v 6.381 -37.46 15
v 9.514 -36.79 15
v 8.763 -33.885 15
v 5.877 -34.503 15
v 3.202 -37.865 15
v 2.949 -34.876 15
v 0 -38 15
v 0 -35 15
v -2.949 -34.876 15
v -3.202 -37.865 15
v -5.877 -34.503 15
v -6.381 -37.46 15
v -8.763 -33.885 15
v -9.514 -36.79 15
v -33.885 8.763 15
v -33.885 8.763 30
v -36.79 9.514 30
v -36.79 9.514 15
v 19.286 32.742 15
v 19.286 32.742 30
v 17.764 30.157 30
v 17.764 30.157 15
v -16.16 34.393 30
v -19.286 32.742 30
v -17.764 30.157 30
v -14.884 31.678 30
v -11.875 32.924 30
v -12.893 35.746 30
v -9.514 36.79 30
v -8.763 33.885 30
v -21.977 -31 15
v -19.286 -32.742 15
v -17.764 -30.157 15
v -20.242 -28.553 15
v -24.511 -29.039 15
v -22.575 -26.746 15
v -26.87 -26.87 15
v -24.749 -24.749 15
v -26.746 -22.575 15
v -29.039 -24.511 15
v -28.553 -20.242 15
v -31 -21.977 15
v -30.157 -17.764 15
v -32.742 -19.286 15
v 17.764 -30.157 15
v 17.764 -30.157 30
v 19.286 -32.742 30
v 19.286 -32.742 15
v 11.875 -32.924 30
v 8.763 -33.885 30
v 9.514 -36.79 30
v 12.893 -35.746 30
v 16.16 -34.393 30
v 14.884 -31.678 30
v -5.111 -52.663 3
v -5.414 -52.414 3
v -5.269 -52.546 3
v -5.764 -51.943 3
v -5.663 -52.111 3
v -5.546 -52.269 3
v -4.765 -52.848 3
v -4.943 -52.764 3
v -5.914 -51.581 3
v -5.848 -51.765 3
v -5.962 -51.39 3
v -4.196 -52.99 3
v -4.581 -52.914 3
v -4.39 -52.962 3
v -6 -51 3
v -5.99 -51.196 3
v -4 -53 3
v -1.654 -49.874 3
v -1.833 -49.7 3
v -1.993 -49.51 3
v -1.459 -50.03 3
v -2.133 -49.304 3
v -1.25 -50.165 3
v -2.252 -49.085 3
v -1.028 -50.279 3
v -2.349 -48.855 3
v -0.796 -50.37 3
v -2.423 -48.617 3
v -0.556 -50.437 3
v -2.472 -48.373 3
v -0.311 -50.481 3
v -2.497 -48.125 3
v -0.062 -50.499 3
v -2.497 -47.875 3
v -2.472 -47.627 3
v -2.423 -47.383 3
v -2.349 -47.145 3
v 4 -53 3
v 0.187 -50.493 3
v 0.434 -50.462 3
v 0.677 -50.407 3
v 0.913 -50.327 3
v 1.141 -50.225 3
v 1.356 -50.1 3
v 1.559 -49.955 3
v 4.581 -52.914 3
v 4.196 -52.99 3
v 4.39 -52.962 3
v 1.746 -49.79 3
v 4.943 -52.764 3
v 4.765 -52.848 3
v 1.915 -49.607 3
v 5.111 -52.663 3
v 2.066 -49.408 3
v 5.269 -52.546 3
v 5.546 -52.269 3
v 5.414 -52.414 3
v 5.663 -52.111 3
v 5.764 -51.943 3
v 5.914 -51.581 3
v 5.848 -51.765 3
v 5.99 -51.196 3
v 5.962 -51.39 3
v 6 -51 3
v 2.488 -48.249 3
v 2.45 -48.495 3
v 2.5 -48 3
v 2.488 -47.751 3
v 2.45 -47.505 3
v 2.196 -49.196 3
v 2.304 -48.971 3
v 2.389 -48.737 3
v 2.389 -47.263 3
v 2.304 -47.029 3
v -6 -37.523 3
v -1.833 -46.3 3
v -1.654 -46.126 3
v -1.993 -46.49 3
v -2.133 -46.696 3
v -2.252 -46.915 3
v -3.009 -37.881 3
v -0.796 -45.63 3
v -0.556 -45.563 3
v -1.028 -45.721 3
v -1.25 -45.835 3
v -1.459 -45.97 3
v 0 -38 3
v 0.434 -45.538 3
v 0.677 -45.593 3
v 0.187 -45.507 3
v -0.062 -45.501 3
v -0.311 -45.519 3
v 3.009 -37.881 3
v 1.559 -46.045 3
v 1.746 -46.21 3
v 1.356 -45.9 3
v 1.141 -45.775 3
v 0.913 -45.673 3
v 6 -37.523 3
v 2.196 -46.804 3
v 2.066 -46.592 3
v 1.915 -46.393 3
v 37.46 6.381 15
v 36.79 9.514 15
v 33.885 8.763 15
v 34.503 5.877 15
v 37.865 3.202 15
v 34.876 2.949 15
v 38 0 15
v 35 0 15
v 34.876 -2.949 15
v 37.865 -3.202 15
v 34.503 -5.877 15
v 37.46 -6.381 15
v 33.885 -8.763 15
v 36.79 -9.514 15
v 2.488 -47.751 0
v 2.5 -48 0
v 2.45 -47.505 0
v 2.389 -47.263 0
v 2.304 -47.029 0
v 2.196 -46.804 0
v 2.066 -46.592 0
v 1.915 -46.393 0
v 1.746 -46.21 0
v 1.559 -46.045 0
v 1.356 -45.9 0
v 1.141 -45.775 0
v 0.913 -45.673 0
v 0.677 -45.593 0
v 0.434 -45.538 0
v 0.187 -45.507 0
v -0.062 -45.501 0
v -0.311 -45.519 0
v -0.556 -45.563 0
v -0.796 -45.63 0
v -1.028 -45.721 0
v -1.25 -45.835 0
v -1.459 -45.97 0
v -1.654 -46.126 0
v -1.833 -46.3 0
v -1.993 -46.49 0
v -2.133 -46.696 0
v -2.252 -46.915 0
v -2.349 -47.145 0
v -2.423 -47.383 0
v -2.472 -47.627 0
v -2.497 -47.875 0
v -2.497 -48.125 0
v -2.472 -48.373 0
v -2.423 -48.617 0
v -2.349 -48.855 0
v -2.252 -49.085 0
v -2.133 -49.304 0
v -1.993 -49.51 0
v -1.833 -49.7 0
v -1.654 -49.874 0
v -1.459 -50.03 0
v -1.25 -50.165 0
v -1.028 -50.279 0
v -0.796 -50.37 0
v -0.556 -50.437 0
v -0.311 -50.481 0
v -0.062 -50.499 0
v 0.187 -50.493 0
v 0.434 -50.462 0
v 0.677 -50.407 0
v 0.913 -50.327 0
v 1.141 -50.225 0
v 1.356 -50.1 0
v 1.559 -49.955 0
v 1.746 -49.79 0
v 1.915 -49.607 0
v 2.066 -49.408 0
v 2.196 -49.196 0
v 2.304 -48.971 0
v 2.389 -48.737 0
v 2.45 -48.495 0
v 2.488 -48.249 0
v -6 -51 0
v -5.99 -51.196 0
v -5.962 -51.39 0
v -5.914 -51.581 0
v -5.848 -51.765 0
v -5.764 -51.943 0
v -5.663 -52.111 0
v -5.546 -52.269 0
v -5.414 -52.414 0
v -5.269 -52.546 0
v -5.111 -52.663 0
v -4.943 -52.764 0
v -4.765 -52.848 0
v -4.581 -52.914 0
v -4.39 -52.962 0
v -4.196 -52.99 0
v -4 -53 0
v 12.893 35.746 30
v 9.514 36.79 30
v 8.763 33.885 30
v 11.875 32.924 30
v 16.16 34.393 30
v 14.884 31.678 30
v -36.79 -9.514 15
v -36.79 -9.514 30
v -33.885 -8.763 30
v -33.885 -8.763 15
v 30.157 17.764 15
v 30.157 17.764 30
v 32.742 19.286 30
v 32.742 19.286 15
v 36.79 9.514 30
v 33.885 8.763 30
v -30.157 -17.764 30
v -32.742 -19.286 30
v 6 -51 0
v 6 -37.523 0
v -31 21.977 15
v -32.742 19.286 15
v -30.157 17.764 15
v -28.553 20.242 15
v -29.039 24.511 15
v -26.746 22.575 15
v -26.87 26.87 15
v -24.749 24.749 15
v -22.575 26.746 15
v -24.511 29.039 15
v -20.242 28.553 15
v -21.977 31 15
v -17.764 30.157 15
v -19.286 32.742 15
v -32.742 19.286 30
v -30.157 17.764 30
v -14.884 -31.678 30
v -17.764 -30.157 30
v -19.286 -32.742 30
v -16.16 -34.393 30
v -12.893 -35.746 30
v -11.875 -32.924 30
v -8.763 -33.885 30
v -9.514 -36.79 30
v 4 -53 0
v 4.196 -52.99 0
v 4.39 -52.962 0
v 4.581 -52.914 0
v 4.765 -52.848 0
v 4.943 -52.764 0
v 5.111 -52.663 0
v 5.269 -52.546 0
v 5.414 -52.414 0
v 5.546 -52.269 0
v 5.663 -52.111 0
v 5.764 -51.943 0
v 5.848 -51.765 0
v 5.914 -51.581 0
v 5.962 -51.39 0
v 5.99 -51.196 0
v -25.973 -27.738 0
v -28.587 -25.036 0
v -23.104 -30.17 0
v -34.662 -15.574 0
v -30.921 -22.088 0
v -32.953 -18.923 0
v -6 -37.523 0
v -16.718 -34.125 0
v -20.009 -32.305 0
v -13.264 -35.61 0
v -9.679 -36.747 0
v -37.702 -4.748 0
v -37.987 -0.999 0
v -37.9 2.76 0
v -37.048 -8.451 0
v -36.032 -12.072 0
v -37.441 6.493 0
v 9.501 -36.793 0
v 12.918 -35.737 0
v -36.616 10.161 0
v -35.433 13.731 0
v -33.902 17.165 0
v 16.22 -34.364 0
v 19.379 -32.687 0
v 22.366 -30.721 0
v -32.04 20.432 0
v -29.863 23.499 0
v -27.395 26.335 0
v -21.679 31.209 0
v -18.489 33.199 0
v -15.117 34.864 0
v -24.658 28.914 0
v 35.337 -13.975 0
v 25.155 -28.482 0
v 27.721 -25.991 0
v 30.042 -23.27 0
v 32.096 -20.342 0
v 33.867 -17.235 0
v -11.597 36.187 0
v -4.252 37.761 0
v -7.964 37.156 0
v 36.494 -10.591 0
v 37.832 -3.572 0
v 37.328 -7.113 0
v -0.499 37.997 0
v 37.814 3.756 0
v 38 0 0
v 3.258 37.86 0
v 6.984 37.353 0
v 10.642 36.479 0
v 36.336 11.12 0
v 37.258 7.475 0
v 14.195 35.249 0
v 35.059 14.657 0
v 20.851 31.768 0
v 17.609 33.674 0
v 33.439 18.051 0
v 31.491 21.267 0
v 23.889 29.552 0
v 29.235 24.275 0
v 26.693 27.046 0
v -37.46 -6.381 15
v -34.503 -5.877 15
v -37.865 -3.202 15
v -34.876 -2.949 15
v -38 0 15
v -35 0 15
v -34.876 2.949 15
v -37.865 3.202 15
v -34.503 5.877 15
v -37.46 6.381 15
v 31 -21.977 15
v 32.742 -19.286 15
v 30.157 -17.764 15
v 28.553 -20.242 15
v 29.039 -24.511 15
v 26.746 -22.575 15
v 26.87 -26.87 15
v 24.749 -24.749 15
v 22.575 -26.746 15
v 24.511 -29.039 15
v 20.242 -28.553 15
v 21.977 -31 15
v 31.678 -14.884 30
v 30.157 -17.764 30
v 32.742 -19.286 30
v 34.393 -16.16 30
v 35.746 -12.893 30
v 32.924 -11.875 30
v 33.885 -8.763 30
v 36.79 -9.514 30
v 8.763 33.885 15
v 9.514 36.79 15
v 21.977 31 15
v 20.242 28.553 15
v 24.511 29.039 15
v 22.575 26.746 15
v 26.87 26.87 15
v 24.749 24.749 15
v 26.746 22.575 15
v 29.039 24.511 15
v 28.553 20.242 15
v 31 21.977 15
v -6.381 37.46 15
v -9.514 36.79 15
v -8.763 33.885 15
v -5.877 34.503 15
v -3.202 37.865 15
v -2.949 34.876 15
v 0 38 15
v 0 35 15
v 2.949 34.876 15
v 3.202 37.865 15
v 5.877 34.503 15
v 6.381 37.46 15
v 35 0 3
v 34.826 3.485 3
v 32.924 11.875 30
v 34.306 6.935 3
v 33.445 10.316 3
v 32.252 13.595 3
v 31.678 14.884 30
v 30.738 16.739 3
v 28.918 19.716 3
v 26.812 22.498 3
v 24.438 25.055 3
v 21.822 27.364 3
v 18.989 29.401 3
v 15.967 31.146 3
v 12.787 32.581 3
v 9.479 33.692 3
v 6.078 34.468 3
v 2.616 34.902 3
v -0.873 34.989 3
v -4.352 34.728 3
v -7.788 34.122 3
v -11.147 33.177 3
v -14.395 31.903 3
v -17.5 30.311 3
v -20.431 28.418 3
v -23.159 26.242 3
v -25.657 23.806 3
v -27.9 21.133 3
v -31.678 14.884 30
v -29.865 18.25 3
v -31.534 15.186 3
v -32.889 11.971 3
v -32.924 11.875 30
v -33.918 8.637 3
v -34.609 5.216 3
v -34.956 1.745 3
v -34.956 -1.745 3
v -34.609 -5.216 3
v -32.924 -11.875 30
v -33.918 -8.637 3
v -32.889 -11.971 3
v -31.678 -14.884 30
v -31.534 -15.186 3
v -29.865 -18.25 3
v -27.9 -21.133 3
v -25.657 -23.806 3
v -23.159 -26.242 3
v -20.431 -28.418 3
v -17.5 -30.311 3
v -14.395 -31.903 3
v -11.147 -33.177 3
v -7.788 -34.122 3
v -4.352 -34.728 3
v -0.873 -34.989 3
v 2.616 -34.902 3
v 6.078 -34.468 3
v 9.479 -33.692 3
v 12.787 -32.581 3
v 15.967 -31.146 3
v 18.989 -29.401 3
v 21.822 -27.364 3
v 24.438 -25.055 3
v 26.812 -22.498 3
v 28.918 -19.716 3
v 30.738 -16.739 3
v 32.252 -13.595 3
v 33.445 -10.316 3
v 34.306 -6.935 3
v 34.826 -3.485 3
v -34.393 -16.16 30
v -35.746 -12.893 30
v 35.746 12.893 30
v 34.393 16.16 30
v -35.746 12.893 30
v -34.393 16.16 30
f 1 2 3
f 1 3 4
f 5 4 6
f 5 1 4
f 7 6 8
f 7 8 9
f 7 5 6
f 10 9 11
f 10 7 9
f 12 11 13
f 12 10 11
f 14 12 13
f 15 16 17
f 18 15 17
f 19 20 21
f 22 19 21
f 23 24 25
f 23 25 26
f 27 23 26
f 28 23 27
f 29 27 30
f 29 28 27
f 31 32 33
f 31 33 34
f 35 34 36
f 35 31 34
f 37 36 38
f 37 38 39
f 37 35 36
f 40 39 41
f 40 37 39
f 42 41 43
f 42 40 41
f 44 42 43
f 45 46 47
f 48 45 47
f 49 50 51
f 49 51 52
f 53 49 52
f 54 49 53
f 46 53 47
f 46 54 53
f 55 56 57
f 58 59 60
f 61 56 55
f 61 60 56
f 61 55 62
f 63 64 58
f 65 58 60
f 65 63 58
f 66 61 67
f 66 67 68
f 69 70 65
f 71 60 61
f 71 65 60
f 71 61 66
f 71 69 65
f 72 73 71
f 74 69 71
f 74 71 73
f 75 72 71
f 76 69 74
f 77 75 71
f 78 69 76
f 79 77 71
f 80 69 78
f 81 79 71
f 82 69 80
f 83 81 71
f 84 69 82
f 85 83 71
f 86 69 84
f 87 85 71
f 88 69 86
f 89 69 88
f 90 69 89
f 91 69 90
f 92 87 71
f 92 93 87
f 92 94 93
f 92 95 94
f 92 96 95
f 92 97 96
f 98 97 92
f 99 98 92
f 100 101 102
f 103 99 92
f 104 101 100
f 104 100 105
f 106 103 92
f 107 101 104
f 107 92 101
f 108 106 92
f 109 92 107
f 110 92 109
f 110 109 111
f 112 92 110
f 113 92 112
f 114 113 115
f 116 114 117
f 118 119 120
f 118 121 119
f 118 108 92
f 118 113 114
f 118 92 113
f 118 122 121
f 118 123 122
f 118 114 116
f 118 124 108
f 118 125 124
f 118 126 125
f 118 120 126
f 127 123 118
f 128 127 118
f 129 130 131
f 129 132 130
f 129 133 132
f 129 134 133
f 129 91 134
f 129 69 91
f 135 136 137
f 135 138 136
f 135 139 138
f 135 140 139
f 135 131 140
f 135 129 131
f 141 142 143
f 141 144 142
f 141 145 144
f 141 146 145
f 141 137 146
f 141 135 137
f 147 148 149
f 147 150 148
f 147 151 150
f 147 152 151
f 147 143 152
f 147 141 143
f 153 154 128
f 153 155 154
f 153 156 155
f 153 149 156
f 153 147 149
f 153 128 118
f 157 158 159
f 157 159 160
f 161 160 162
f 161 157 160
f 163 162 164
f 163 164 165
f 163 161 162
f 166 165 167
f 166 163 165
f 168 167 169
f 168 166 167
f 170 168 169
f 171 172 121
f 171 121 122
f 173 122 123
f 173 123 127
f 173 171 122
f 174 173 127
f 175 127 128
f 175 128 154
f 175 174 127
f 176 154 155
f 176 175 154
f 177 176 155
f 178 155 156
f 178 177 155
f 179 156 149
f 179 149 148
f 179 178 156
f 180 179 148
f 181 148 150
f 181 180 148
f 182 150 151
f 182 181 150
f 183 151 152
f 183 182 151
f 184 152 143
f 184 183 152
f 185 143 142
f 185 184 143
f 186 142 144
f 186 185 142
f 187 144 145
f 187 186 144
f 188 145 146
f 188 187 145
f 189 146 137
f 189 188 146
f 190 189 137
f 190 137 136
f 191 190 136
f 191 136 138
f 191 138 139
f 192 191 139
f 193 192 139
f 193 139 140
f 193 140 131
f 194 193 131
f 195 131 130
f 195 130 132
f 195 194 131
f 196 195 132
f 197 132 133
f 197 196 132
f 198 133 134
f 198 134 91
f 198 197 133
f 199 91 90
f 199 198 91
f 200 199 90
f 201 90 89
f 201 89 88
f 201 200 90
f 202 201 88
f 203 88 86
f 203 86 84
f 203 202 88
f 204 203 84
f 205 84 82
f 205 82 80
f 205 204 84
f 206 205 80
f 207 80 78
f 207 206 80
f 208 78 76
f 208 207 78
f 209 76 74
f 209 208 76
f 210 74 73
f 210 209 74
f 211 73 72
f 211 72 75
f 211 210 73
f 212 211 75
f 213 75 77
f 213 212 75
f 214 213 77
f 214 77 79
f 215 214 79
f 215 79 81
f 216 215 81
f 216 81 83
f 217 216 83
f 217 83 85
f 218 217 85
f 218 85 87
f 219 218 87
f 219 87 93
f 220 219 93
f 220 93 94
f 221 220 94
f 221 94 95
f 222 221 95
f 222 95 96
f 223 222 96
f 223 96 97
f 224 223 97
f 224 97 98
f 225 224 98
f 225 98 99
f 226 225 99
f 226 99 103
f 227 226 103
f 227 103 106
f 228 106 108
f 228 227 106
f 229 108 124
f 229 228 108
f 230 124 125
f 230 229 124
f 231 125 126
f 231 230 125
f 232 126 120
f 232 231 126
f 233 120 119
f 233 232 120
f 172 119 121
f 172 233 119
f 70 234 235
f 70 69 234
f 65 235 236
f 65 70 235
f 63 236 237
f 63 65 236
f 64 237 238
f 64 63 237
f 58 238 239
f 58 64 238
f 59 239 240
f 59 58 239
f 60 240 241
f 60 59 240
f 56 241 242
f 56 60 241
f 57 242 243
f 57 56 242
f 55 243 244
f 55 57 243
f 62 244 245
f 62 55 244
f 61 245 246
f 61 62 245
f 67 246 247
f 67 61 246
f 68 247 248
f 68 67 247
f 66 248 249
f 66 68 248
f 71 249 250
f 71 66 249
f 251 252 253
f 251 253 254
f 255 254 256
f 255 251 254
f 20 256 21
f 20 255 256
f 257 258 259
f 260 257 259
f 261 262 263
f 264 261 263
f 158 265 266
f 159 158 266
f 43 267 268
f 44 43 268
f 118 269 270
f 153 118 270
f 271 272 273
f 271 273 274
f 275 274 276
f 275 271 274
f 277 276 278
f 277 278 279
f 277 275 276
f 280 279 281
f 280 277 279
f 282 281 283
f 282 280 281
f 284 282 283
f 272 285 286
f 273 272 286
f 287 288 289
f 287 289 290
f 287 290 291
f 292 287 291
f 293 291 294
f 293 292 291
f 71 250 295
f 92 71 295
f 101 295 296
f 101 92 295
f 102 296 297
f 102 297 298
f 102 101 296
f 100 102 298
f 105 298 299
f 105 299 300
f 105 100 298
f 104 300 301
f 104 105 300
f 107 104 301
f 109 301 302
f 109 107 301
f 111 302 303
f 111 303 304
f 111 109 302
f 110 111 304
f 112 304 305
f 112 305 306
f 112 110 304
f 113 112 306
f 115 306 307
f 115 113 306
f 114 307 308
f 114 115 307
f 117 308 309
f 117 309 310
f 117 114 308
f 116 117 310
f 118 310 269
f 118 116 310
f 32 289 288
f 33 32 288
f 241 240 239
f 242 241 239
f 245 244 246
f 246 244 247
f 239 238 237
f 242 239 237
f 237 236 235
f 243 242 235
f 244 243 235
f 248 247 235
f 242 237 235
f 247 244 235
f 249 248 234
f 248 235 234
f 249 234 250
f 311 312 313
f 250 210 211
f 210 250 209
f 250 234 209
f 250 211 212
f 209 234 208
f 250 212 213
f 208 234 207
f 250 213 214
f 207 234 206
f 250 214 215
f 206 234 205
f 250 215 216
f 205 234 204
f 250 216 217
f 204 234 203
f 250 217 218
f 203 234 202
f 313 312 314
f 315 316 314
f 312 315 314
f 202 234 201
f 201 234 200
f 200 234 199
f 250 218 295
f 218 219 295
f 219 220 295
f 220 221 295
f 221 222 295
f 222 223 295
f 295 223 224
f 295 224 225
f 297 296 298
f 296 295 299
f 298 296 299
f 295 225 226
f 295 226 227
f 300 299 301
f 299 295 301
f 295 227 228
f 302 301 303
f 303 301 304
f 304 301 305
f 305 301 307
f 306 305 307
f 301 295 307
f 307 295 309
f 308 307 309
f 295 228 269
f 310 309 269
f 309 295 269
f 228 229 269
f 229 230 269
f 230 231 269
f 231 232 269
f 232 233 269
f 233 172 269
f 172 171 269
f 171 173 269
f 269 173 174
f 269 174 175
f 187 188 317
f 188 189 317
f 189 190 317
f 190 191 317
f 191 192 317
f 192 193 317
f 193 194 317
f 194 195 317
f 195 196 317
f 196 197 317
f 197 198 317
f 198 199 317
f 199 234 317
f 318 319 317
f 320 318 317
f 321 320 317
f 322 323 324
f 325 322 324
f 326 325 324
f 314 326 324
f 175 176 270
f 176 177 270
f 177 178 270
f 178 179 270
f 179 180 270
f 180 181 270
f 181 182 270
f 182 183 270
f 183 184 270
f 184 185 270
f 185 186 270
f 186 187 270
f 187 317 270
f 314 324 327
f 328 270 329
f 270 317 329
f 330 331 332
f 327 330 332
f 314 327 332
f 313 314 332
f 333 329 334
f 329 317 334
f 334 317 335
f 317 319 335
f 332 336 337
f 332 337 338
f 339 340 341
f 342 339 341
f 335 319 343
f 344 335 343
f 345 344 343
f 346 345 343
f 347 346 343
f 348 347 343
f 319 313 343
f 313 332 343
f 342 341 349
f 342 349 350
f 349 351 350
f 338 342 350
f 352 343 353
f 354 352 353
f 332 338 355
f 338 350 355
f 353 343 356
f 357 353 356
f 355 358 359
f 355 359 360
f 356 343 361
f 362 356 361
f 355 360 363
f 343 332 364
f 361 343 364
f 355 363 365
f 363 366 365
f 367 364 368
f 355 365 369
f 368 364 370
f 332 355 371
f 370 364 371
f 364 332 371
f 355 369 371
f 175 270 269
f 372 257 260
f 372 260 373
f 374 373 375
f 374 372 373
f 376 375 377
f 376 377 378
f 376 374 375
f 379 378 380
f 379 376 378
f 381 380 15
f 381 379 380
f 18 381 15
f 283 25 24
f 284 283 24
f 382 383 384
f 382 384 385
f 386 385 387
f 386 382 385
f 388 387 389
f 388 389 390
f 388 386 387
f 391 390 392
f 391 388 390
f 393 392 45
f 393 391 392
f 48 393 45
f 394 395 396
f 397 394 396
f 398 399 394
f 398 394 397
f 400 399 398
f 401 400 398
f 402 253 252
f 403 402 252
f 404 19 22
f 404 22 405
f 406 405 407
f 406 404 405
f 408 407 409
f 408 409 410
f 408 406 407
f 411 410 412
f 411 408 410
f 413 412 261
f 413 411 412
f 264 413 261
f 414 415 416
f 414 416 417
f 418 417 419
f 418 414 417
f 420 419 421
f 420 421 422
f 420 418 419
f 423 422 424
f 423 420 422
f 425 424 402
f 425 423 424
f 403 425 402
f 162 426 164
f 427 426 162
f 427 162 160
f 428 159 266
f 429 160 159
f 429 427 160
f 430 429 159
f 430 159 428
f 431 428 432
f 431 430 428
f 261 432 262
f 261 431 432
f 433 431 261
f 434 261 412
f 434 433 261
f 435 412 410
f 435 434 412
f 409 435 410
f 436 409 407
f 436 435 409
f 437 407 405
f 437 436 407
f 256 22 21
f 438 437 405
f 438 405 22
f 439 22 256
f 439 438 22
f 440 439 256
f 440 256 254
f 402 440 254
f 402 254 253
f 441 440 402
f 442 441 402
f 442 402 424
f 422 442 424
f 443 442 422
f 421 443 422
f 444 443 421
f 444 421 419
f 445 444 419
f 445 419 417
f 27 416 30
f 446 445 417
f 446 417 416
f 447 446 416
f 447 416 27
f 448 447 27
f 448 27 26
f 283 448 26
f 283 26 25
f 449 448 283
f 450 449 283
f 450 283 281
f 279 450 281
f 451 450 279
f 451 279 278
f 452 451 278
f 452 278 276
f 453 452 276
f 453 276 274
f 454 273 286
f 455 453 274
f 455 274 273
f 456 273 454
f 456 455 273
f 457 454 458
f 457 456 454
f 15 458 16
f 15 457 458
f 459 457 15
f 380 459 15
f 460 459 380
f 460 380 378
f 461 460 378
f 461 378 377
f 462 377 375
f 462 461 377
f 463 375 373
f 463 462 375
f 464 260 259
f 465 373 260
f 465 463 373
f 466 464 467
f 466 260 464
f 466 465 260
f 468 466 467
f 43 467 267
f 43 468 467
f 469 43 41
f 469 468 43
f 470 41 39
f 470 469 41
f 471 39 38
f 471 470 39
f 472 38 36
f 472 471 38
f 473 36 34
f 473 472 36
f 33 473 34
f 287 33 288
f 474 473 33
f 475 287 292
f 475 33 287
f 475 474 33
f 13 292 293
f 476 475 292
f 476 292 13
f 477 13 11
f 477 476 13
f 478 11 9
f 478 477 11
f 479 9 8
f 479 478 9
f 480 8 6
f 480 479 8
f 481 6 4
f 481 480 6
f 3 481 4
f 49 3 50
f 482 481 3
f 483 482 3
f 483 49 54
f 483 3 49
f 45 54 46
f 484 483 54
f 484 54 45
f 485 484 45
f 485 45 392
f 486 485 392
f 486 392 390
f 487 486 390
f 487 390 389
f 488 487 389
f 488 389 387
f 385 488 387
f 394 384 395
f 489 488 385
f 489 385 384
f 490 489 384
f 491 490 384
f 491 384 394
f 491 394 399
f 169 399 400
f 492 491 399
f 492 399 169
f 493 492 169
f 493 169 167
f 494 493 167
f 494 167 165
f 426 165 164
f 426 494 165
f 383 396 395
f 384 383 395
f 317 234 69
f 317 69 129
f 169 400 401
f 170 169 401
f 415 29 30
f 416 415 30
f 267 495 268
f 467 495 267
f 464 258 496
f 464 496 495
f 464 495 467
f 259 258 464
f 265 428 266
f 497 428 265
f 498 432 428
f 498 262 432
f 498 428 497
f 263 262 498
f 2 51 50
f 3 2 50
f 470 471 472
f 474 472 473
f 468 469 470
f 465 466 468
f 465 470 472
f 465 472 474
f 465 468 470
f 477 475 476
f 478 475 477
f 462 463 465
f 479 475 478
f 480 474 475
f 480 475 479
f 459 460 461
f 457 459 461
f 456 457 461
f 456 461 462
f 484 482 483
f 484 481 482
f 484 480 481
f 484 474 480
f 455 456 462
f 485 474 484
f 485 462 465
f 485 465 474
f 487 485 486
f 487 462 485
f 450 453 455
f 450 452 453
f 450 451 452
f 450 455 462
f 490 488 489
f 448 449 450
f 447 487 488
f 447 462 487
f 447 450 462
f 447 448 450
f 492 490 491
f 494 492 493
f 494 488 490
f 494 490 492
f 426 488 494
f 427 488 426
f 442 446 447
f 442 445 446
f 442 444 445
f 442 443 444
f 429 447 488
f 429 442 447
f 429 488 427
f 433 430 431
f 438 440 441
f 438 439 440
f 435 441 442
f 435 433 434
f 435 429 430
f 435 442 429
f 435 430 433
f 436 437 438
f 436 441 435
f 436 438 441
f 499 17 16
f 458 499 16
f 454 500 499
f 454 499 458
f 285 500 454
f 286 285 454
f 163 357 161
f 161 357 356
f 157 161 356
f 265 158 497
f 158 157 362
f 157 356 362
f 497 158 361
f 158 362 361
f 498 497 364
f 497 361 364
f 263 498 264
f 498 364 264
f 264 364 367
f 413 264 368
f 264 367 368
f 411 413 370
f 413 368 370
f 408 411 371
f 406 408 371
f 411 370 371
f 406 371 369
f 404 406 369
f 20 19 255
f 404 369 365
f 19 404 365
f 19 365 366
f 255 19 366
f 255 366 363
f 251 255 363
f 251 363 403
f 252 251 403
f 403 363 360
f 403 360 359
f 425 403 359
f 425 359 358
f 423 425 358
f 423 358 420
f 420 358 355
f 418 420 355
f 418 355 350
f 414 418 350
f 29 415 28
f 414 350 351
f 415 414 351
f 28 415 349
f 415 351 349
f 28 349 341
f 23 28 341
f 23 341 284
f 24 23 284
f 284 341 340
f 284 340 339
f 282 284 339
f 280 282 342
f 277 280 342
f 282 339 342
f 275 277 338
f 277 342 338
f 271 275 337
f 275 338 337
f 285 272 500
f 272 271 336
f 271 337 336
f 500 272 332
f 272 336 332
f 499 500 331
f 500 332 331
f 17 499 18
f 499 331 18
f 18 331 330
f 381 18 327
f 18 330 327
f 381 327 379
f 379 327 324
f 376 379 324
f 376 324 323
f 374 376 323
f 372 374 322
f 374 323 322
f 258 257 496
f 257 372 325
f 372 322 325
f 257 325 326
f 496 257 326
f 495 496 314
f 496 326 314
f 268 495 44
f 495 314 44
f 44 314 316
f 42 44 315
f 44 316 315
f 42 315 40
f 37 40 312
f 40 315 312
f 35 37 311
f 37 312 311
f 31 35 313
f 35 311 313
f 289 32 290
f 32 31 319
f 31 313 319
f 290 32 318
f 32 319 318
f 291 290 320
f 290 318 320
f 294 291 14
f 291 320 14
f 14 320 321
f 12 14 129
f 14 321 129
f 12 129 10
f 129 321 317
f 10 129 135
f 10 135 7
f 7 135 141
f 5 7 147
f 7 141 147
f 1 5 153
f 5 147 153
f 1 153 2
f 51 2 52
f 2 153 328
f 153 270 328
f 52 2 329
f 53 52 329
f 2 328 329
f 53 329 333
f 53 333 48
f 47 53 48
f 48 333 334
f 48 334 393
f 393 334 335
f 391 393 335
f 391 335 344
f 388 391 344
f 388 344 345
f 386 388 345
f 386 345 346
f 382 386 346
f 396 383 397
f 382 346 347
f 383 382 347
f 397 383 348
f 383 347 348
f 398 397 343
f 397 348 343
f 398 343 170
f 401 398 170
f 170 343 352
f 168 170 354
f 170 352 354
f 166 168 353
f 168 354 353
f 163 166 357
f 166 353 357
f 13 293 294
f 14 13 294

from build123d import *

# Parameters (mm, degrees)
F0_R            = 38
F1_DEPTH        = 3
F2_R            = 38
F2_R_2          = 35
F3_DEPTH        = 27
F4_W            = 12
F4_H            = 23
F4_R            = 2.5
F5_DEPTH        = 3
F6_R            = 2
F8_DEPTH        = 15
F8_COPIES_COUNT = 8


# Not quite as in the source:
# - a pattern or mirror of a feature is missing from the dataset's text; its kind, count and spacing are read off the source's solid


with BuildPart() as f1:
    # F0 (on Top) → F1 (new body)
    with BuildSketch(Plane.XY):
        Circle(F0_R)
    extrude(amount=F1_DEPTH)

    # F2 (on face) → F3 (join)
    with BuildSketch(Plane.XY.offset(3)):
        Circle(F2_R)
        Circle(F2_R_2, mode=Mode.SUBTRACT)
    extrude(amount=F3_DEPTH)

    # F4 (on Top) → F5 (join)
    with BuildSketch(Plane.XY):
        with Locations((0, -41.5)):
            Rectangle(F4_W, F4_H)
        with Locations((0, -48)):
            Circle(F4_R, mode=Mode.SUBTRACT)
    extrude(amount=F5_DEPTH)

    # F6
    f6_edges = [f1.edges().sort_by_distance(p)[0] for p in [
        (6, -53, 1.5),
        (-6, -53, 1.5),
    ]]
    fillet(f6_edges, radius=F6_R)

    # F7 (on face) → F8 (cut)
    with BuildSketch(Plane.XY.offset(30)):
        with BuildLine():
            Line((-9.5144401541, 36.7896103344), (-8.7633001419, 33.8851674132))
            ThreePointArc((-8.7633001419, 33.8851674132), (0, 35), (8.7633001419, 33.8851674132))
            Line((8.7633001419, 33.8851674132), (9.5144401541, 36.7896103344))
            ThreePointArc((9.5144401541, 36.7896103344), (0, 38), (-9.5144401541, 36.7896103344))
        make_face()
    f8 = extrude(amount=-F8_DEPTH, mode=Mode.SUBTRACT)

    # F8_copies: F8 ×8 about axis
    f8_copies_axis = Axis((0, 0, 0), (0, 0, 1))
    for i in range(1, F8_COPIES_COUNT):
        add(f8.rotate(f8_copies_axis, i * 360 / F8_COPIES_COUNT), mode=Mode.SUBTRACT)


solid = f1.part
